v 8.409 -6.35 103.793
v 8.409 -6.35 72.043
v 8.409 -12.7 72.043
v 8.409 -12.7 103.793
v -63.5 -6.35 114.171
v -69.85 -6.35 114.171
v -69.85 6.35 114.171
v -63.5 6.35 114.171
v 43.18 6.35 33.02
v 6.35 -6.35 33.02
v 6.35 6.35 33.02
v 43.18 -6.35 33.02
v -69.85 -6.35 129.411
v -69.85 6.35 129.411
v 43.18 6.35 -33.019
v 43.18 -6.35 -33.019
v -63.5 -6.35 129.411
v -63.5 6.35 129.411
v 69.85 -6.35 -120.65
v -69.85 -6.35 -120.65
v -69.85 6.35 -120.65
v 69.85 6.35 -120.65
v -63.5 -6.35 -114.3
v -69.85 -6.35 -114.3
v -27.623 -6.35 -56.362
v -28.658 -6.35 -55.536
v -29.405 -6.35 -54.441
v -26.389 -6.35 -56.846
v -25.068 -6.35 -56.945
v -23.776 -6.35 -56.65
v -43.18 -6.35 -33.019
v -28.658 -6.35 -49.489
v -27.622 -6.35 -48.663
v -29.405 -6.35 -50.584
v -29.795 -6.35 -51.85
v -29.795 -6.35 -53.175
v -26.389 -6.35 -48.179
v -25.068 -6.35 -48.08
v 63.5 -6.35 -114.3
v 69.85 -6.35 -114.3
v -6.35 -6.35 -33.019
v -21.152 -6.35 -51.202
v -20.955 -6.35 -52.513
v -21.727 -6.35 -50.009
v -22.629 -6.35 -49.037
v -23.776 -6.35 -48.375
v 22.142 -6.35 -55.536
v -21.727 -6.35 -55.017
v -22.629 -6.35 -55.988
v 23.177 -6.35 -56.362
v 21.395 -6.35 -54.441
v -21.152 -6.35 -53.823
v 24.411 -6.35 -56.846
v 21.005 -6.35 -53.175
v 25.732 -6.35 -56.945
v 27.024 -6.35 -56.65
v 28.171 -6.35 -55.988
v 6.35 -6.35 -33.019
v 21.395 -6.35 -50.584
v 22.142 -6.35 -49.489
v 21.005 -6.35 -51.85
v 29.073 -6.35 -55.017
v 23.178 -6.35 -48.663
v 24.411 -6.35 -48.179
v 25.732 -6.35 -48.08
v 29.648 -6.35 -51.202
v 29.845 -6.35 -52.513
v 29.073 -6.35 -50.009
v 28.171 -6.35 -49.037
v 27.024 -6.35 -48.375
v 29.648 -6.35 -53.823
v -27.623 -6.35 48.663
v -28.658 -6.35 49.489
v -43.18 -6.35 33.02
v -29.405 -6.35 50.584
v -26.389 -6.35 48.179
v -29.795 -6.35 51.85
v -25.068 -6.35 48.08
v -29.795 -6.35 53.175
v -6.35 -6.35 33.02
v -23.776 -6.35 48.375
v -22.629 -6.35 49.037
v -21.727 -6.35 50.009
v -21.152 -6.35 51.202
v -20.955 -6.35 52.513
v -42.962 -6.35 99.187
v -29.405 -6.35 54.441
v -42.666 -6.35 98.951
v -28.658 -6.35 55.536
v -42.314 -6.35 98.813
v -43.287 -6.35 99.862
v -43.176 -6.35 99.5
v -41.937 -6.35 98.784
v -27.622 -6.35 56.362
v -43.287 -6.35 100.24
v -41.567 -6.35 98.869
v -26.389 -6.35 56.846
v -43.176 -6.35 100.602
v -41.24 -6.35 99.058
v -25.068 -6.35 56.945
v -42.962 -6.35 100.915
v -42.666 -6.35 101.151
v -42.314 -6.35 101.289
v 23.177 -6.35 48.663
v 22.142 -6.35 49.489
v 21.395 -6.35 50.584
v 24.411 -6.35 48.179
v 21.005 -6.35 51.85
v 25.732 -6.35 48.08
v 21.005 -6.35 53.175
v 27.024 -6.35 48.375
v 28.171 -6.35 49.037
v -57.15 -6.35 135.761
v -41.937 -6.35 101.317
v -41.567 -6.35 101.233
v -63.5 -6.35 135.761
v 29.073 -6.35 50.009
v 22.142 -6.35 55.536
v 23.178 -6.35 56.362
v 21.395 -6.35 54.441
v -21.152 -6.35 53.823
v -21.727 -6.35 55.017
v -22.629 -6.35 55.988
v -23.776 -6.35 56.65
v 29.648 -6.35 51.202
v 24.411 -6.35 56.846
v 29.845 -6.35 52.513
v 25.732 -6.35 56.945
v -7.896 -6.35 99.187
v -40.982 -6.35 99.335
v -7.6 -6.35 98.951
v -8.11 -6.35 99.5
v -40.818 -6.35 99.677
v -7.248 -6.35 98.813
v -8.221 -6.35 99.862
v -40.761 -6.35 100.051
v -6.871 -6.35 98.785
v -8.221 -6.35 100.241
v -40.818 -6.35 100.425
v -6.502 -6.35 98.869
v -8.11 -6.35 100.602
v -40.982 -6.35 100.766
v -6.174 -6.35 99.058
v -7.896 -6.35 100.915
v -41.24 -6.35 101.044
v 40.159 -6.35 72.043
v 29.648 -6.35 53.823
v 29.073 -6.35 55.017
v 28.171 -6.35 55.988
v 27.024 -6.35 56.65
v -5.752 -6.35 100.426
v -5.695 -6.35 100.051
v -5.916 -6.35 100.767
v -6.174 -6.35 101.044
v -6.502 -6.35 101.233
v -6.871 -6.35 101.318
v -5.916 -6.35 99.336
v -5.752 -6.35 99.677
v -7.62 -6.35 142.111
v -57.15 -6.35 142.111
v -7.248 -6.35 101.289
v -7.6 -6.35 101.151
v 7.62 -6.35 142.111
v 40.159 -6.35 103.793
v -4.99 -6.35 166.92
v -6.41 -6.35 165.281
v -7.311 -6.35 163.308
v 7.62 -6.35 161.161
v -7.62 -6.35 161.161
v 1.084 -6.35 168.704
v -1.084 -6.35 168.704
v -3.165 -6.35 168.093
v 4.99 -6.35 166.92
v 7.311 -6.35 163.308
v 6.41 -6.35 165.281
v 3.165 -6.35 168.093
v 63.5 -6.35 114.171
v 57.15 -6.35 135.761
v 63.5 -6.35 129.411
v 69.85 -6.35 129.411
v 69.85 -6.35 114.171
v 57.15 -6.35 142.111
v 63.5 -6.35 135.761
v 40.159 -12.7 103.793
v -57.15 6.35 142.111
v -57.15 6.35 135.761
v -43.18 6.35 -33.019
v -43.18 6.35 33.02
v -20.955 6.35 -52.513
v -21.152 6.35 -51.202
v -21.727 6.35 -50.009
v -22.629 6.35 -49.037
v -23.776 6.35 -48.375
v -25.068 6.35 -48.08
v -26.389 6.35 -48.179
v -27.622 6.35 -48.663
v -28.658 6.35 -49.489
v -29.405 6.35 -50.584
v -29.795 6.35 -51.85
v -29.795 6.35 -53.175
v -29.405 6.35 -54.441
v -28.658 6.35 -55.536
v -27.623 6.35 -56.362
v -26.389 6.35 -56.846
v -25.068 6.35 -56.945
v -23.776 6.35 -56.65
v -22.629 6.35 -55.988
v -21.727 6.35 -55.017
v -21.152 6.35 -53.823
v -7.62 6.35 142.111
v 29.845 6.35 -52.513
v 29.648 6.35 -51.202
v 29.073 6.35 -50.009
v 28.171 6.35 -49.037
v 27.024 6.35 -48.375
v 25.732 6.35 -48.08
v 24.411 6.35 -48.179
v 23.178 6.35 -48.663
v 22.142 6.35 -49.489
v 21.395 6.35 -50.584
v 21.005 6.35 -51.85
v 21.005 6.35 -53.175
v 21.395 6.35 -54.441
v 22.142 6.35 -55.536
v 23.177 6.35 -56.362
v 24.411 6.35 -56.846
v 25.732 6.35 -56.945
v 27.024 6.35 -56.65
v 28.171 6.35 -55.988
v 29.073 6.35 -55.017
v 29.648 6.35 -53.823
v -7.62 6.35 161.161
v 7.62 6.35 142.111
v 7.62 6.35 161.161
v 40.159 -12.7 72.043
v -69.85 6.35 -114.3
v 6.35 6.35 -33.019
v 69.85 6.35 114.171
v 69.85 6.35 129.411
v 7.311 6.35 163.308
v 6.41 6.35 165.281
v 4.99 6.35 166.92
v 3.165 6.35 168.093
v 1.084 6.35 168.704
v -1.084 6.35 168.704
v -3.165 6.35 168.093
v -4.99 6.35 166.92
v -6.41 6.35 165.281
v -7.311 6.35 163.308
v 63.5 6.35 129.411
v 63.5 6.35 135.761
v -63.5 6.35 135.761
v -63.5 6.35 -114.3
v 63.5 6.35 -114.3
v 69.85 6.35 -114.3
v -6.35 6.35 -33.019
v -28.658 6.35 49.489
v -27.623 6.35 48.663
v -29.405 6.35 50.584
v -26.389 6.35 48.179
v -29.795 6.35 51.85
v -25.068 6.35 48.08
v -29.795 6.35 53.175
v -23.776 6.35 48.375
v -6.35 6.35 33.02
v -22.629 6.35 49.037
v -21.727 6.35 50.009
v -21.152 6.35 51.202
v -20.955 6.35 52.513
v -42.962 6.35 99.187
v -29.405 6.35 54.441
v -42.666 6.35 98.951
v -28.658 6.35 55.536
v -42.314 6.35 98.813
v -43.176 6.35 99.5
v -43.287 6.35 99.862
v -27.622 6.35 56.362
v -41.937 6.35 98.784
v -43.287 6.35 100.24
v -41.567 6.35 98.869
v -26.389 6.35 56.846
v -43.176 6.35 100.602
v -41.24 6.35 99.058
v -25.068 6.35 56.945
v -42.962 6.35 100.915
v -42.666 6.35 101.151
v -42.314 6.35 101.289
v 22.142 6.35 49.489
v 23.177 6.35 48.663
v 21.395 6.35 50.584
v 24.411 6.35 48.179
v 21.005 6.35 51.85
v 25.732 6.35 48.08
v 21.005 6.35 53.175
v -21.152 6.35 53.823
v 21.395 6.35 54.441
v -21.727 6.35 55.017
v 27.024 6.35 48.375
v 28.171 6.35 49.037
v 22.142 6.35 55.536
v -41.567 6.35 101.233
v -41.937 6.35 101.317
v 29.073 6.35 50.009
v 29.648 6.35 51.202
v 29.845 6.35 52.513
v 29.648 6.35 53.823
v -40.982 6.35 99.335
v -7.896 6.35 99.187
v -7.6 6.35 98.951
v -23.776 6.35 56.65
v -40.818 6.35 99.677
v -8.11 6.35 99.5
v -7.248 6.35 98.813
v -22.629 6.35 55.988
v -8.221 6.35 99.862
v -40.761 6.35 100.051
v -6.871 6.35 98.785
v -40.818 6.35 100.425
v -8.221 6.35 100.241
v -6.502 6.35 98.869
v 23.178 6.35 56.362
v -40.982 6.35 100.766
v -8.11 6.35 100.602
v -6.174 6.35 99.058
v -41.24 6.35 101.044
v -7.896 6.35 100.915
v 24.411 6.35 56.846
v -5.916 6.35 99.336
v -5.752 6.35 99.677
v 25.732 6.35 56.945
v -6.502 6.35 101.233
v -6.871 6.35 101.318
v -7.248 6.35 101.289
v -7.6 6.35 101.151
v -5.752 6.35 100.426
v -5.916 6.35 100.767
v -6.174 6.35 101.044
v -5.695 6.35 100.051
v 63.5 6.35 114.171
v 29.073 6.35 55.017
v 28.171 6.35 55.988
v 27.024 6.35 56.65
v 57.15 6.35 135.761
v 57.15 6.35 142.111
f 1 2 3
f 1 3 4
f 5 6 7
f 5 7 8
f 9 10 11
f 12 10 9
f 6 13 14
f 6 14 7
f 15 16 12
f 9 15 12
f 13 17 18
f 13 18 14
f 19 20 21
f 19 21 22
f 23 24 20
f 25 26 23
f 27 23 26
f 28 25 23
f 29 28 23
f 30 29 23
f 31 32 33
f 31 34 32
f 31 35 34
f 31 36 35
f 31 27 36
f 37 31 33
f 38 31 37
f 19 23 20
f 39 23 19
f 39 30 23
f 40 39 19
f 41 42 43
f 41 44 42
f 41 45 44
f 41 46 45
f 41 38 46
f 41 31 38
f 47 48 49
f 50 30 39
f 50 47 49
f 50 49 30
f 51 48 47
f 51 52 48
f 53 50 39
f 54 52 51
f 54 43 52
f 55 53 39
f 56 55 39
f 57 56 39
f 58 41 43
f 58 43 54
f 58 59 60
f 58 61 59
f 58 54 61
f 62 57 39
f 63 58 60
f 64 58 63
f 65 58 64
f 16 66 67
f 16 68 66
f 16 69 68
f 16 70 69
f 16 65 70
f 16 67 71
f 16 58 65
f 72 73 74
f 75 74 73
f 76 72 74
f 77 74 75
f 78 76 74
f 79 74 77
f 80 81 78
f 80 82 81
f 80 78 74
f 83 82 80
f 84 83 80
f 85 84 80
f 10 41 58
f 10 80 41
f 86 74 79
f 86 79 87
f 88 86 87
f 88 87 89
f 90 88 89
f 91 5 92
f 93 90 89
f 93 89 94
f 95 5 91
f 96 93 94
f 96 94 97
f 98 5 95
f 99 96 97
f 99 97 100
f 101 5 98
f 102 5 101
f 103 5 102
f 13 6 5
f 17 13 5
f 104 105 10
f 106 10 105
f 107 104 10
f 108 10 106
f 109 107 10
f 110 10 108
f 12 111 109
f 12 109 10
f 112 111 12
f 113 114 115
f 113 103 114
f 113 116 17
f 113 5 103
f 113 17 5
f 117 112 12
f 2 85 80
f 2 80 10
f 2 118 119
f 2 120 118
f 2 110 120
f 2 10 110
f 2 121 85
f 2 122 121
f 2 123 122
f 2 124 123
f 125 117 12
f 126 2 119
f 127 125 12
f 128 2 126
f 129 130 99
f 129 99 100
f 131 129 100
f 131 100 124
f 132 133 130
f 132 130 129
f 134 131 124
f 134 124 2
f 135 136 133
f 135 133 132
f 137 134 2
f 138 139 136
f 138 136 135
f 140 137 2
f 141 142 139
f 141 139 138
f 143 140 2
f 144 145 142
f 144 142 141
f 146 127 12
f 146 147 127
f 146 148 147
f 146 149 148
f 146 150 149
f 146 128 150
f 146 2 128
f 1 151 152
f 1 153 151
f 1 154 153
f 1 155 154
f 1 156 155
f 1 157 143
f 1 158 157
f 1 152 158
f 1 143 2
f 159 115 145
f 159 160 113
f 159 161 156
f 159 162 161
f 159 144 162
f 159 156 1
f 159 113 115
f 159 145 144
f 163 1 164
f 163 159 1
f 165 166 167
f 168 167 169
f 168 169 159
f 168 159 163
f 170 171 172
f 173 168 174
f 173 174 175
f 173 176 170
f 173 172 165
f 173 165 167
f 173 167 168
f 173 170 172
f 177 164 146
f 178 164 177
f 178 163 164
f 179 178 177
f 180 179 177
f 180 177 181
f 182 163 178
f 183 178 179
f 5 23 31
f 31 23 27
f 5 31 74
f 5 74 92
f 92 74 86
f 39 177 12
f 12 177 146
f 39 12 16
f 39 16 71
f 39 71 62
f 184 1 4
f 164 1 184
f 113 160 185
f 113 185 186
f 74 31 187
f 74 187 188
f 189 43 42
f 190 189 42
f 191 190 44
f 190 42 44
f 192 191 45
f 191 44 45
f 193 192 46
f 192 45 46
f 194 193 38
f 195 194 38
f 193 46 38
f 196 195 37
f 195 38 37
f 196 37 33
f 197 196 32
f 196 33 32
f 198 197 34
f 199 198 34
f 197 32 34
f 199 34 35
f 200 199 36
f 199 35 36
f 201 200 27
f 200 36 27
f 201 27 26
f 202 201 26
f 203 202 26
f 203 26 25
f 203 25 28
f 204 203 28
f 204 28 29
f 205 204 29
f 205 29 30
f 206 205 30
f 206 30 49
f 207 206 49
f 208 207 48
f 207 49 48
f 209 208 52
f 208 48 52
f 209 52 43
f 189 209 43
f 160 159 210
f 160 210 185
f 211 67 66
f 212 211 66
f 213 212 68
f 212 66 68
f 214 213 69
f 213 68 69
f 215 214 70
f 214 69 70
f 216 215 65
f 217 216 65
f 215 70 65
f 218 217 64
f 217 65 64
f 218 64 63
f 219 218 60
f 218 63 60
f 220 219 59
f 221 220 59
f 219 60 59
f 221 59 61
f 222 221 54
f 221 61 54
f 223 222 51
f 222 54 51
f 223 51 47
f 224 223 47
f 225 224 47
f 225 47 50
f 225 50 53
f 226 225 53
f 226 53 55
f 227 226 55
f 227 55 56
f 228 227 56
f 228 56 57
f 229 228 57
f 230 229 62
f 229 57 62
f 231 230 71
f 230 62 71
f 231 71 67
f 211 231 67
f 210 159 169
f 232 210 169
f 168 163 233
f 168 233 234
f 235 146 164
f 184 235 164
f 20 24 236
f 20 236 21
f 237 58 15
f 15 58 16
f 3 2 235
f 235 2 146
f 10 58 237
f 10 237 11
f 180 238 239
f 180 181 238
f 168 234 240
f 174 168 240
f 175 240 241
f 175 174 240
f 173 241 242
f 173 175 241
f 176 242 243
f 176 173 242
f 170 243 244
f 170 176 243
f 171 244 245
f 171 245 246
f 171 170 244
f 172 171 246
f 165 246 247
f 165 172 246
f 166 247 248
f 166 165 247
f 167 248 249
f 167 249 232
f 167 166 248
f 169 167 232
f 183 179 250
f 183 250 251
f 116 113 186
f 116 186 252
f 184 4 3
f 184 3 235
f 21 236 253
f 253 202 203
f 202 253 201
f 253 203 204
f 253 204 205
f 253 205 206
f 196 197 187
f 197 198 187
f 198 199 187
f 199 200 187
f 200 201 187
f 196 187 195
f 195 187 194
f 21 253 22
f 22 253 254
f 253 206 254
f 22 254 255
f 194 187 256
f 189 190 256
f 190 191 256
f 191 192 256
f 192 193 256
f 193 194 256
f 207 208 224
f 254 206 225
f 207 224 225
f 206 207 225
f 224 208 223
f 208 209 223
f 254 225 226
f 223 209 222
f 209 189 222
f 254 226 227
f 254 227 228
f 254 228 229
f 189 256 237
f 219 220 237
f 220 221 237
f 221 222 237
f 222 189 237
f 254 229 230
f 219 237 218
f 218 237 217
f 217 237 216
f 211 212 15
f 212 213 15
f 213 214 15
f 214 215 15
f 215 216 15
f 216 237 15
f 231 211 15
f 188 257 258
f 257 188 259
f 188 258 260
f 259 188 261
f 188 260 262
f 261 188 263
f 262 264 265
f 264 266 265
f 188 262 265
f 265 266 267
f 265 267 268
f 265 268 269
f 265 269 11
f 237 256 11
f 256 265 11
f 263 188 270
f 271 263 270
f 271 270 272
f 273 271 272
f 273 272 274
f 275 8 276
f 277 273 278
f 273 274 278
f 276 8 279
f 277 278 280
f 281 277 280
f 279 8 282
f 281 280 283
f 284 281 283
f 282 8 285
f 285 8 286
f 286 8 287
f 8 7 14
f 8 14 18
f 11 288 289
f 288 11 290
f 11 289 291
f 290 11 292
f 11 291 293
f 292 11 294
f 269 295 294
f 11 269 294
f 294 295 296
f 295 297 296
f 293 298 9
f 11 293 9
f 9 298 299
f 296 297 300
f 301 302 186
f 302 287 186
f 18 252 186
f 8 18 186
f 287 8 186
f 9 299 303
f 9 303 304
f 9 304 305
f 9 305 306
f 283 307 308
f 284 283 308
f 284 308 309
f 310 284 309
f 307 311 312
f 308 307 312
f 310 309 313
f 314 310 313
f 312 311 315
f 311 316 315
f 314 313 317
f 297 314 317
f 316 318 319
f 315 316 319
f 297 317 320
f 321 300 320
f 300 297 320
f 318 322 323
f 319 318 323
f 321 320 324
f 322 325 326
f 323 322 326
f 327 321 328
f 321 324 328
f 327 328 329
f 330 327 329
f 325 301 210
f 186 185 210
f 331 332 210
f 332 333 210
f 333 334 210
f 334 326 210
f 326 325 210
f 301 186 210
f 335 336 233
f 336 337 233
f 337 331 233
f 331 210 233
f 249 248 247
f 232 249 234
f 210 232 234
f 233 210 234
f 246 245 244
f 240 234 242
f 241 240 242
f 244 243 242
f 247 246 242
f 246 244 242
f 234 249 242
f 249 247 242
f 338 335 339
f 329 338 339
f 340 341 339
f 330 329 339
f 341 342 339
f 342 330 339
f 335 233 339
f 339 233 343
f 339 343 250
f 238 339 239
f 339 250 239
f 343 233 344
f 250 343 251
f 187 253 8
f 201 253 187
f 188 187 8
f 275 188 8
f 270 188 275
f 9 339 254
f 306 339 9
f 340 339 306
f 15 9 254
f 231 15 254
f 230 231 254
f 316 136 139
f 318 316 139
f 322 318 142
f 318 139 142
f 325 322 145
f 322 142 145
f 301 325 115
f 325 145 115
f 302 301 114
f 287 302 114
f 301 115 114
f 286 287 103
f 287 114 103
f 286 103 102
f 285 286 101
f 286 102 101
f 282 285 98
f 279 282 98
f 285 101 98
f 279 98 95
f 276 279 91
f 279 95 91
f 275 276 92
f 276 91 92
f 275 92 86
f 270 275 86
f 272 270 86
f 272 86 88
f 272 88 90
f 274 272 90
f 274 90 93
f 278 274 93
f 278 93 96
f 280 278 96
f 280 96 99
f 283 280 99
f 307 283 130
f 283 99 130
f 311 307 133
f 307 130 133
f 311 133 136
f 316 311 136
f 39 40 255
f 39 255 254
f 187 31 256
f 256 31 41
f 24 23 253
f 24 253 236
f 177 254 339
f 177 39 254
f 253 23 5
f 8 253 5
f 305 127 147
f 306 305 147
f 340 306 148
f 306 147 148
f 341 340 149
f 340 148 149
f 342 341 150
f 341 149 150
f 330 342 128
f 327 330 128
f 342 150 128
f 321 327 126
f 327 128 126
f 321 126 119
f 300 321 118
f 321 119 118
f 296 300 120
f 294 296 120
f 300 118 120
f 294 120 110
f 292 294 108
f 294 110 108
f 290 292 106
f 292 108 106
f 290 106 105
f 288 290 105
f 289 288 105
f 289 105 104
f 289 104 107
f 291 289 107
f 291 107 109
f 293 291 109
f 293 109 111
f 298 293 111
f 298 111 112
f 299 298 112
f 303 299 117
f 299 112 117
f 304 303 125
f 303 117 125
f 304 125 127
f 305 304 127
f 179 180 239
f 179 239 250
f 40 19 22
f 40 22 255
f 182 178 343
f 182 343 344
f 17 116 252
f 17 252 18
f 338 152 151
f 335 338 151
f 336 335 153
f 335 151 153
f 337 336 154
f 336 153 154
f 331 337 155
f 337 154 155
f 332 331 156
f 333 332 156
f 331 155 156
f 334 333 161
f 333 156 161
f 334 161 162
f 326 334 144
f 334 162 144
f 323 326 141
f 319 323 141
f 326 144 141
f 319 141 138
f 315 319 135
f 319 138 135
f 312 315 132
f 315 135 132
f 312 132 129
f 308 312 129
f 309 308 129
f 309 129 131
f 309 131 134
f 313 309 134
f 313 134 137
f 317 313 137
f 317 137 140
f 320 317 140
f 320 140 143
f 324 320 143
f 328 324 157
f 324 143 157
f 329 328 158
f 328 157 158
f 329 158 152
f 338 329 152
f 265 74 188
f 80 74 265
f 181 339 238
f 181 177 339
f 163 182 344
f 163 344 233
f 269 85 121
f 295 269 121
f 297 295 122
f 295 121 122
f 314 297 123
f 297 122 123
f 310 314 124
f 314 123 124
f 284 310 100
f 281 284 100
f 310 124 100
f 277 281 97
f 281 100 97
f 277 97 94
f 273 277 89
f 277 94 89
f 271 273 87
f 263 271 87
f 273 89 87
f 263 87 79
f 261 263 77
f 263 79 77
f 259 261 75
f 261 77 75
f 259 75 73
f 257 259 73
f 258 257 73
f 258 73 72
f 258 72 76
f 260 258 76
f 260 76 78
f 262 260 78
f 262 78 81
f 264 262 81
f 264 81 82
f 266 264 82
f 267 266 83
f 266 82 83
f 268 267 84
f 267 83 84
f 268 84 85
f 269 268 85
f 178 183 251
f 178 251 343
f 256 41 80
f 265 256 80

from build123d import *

# Parameters (mm, degrees)
F0_W      = 127
F0_H      = 0.1285925341
F0_H_2    = 228.4714074659
F0_W_2    = 15.24
F0_H_3    = 19.05
F3_DEPTH  = 6.35
F2_W      = 31.75
F2_H      = 31.75
F4_DEPTH  = 12.7
F5_W      = 36.83
F5_H      = 66.039527216
F6_DEPTH  = 50.8
F7_R      = 1.27
F8_DEPTH  = 12.7
F9_R      = 4.445
F10_DEPTH = 12.7


with BuildPart() as f3:
    # F0 (on Front) → F3 (new body, symmetric)
    with BuildSketch(Plane.XZ):
        Polygon((-63.5, 114.1714074659), (-63.5, 114.3), (63.5, 114.3), (63.5, 114.1714074659), (69.85, 114.1714074659), (69.85, 129.4114074659), (63.5, 129.4114074659), (-63.5, 129.4114074659), (-69.85, 129.4114074659), (-69.85, 114.1714074659), align=None)
        with Locations((0, 114.235703733)):
            Rectangle(F0_W, F0_H)
        with Locations((0, -0.064296267)):
            Rectangle(F0_W, F0_H_2)
        Polygon((63.5, -114.3), (-63.5, -114.3), (-69.85, -114.3), (-69.85, -120.65), (69.85, -120.65), (69.85, -114.3), align=None)
        Polygon((-63.5, 135.7614074659), (-63.5, 129.4114074659), (63.5, 129.4114074659), (63.5, 135.7614074659), (57.15, 135.7614074659), (-57.15, 135.7614074659), align=None)
        Polygon((-57.15, 142.1114074659), (-57.15, 135.7614074659), (57.15, 135.7614074659), (57.15, 142.1114074659), (7.62, 142.1114074659), (-7.62, 142.1114074659), align=None)
        with Locations((0, 151.6364074659)):
            Rectangle(F0_W_2, F0_H_3)
        with BuildLine():
            ThreePointArc((7.62, 161.1614074659), (0, 168.7814074659), (-7.62, 161.1614074659))
            Line((-7.62, 161.1614074659), (7.62, 161.1614074659))
        make_face()
    extrude(amount=F3_DEPTH, both=True)

    # F2 (on face) → F4 (join)
    with BuildSketch(Plane.XZ):
        with Locations((24.2836736143, 87.9182294011)):
            Rectangle(F2_W, F2_H)
    extrude(amount=F4_DEPTH)

    # F5 (on face) → F6 (cut)
    with BuildSketch(Plane.XZ.offset(6.35)):
        with Locations((24.765, 0.0003129244)):
            Rectangle(F5_W, F5_H)
        with Locations((-24.765, 0.0003129244)):
            Rectangle(F5_W, F5_H)
    extrude(amount=-F6_DEPTH, mode=Mode.SUBTRACT)

    # F7 (on face) → F8 (cut, symmetric)
    with BuildSketch(Plane.XZ.offset(6.35)):
        with Locations((-42.0314632356, 100.0508442521)):
            Circle(F7_R)
        with Locations((-6.9654858671, 100.0512316823)):
            Circle(F7_R)
    extrude(amount=F8_DEPTH, both=True, mode=Mode.SUBTRACT)

    # F9 (on face) → F10 (cut, symmetric)
    with BuildSketch(Plane.XZ.offset(6.35)):
        with Locations((-25.4, 52.5126196444)):
            Circle(F9_R)
        with Locations((25.4, 52.5126196444)):
            Circle(F9_R)
        with Locations((-25.4, -52.5126196444)):
            Circle(F9_R)
        with Locations((25.4, -52.5126196444)):
            Circle(F9_R)
    extrude(amount=F10_DEPTH, both=True, mode=Mode.SUBTRACT)


solid = f3.part
